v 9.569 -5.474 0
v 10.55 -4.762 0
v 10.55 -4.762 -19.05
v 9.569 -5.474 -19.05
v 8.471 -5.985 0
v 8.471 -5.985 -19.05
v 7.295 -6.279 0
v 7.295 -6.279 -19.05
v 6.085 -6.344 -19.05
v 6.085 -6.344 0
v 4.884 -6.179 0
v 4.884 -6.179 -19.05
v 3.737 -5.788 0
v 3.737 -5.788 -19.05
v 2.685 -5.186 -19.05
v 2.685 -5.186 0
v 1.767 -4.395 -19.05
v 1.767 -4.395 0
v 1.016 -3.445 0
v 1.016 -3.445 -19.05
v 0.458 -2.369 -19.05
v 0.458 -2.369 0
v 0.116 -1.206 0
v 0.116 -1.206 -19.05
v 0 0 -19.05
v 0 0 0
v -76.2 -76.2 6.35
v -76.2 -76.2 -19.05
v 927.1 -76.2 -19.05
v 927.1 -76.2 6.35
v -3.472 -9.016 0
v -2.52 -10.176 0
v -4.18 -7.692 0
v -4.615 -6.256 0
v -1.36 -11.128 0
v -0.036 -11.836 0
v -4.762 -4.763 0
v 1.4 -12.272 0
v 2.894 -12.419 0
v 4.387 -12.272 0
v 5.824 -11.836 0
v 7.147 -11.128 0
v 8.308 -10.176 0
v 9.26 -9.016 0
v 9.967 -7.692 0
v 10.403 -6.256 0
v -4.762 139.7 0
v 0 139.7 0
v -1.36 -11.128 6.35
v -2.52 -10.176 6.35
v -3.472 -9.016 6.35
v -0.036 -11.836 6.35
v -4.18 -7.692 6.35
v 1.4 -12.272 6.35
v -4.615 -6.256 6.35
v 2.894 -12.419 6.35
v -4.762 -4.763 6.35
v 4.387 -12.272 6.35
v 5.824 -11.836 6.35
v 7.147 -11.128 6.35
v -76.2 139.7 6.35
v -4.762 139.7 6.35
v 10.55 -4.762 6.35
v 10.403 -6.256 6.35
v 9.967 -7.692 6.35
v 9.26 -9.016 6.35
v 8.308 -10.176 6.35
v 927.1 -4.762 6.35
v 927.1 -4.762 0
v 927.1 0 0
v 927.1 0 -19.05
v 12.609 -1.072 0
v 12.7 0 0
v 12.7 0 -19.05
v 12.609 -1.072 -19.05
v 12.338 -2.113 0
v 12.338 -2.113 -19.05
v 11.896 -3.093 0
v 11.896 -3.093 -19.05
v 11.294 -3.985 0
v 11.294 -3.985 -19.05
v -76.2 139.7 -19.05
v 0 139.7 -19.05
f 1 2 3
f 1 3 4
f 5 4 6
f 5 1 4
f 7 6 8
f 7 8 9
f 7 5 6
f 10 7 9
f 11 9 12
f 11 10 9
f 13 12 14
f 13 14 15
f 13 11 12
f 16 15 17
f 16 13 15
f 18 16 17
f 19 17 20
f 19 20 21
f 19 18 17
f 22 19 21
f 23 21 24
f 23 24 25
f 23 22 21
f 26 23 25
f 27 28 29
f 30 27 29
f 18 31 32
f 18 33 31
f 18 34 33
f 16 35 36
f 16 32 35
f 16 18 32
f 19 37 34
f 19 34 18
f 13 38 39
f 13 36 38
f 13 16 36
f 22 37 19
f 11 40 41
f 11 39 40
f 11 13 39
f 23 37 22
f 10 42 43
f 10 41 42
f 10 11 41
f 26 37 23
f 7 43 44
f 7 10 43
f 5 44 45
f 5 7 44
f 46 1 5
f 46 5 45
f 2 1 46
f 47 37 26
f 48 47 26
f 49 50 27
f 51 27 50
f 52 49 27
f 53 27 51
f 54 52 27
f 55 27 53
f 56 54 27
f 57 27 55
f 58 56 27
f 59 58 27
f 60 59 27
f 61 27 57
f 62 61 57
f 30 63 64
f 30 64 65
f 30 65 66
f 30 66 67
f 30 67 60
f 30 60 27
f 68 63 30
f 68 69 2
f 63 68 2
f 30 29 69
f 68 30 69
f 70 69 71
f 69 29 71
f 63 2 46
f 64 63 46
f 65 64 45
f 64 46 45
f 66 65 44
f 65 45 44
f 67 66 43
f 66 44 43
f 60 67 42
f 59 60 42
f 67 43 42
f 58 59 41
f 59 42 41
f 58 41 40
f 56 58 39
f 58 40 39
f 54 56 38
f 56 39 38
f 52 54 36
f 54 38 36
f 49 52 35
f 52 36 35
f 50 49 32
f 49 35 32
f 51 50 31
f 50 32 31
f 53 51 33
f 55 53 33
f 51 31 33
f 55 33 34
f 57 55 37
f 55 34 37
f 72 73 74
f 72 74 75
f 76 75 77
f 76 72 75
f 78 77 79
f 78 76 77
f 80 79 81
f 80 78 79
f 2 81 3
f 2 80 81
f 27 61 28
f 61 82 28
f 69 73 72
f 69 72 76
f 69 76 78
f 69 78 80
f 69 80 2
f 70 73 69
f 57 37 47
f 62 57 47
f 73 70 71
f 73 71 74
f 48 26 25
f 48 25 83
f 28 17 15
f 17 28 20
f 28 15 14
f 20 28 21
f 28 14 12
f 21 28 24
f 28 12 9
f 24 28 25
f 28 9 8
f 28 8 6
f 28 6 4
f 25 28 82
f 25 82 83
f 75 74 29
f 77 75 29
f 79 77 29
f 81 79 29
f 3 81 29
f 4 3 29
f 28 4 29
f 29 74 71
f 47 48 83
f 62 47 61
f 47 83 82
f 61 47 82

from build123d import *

# Parameters (mm, degrees)
F1_DEPTH = 19.05
F2_DEPTH = 6.35


# Not quite as in the source:
# - a length typed as a fraction of an inch, garbled in the dataset ("3 / 203.2 mm" for 3/8 in), is restored


with BuildPart() as f1:
    # F0 (on Top) → F1 (new body)
    with BuildSketch(Plane.XY):
        with BuildLine():
            Line((927.1, 0), (12.7, 0))
            ThreePointArc((12.7, 0), (12.1376302063, -2.6126302063), (10.5501302063, -4.7625))
            Line((10.5501302063, -4.7625), (927.1, -4.7625))
            Line((927.1, -4.7625), (927.1, 0))
        make_face()
        with BuildLine():
            Line((927.1, -4.7625), (10.5501302063, -4.7625))
            ThreePointArc((10.5501302063, -4.7625), (2.8938151032, -12.4188151032), (-4.7625, -4.7625))
            Line((-4.7625, -4.7625), (-4.7625, 139.7))
            Line((-4.7625, 139.7), (-76.2, 139.7))
            Line((-76.2, 139.7), (-76.2, -76.2))
            Line((-76.2, -76.2), (927.1, -76.2))
            Line((927.1, -76.2), (927.1, -4.7625))
        make_face()
        with BuildLine():
            ThreePointArc((-4.7625, -4.7625), (2.8938151032, -12.4188151032), (10.5501302063, -4.7625))
            ThreePointArc((10.5501302063, -4.7625), (3.7373697937, -5.7876302063), (0, 0))
            Line((0, 0), (0, 139.7))
            Line((0, 139.7), (-4.7625, 139.7))
            Line((-4.7625, 139.7), (-4.7625, -4.7625))
        make_face()
    extrude(amount=-F1_DEPTH)

    # F0 (on Top) → F2 (join)
    with BuildSketch(Plane.XY):
        with BuildLine():
            Line((927.1, -4.7625), (10.5501302063, -4.7625))
            ThreePointArc((10.5501302063, -4.7625), (2.8938151032, -12.4188151032), (-4.7625, -4.7625))
            Line((-4.7625, -4.7625), (-4.7625, 139.7))
            Line((-4.7625, 139.7), (-76.2, 139.7))
            Line((-76.2, 139.7), (-76.2, -76.2))
            Line((-76.2, -76.2), (927.1, -76.2))
            Line((927.1, -76.2), (927.1, -4.7625))
        make_face()
    extrude(amount=F2_DEPTH)


solid = f1.part
